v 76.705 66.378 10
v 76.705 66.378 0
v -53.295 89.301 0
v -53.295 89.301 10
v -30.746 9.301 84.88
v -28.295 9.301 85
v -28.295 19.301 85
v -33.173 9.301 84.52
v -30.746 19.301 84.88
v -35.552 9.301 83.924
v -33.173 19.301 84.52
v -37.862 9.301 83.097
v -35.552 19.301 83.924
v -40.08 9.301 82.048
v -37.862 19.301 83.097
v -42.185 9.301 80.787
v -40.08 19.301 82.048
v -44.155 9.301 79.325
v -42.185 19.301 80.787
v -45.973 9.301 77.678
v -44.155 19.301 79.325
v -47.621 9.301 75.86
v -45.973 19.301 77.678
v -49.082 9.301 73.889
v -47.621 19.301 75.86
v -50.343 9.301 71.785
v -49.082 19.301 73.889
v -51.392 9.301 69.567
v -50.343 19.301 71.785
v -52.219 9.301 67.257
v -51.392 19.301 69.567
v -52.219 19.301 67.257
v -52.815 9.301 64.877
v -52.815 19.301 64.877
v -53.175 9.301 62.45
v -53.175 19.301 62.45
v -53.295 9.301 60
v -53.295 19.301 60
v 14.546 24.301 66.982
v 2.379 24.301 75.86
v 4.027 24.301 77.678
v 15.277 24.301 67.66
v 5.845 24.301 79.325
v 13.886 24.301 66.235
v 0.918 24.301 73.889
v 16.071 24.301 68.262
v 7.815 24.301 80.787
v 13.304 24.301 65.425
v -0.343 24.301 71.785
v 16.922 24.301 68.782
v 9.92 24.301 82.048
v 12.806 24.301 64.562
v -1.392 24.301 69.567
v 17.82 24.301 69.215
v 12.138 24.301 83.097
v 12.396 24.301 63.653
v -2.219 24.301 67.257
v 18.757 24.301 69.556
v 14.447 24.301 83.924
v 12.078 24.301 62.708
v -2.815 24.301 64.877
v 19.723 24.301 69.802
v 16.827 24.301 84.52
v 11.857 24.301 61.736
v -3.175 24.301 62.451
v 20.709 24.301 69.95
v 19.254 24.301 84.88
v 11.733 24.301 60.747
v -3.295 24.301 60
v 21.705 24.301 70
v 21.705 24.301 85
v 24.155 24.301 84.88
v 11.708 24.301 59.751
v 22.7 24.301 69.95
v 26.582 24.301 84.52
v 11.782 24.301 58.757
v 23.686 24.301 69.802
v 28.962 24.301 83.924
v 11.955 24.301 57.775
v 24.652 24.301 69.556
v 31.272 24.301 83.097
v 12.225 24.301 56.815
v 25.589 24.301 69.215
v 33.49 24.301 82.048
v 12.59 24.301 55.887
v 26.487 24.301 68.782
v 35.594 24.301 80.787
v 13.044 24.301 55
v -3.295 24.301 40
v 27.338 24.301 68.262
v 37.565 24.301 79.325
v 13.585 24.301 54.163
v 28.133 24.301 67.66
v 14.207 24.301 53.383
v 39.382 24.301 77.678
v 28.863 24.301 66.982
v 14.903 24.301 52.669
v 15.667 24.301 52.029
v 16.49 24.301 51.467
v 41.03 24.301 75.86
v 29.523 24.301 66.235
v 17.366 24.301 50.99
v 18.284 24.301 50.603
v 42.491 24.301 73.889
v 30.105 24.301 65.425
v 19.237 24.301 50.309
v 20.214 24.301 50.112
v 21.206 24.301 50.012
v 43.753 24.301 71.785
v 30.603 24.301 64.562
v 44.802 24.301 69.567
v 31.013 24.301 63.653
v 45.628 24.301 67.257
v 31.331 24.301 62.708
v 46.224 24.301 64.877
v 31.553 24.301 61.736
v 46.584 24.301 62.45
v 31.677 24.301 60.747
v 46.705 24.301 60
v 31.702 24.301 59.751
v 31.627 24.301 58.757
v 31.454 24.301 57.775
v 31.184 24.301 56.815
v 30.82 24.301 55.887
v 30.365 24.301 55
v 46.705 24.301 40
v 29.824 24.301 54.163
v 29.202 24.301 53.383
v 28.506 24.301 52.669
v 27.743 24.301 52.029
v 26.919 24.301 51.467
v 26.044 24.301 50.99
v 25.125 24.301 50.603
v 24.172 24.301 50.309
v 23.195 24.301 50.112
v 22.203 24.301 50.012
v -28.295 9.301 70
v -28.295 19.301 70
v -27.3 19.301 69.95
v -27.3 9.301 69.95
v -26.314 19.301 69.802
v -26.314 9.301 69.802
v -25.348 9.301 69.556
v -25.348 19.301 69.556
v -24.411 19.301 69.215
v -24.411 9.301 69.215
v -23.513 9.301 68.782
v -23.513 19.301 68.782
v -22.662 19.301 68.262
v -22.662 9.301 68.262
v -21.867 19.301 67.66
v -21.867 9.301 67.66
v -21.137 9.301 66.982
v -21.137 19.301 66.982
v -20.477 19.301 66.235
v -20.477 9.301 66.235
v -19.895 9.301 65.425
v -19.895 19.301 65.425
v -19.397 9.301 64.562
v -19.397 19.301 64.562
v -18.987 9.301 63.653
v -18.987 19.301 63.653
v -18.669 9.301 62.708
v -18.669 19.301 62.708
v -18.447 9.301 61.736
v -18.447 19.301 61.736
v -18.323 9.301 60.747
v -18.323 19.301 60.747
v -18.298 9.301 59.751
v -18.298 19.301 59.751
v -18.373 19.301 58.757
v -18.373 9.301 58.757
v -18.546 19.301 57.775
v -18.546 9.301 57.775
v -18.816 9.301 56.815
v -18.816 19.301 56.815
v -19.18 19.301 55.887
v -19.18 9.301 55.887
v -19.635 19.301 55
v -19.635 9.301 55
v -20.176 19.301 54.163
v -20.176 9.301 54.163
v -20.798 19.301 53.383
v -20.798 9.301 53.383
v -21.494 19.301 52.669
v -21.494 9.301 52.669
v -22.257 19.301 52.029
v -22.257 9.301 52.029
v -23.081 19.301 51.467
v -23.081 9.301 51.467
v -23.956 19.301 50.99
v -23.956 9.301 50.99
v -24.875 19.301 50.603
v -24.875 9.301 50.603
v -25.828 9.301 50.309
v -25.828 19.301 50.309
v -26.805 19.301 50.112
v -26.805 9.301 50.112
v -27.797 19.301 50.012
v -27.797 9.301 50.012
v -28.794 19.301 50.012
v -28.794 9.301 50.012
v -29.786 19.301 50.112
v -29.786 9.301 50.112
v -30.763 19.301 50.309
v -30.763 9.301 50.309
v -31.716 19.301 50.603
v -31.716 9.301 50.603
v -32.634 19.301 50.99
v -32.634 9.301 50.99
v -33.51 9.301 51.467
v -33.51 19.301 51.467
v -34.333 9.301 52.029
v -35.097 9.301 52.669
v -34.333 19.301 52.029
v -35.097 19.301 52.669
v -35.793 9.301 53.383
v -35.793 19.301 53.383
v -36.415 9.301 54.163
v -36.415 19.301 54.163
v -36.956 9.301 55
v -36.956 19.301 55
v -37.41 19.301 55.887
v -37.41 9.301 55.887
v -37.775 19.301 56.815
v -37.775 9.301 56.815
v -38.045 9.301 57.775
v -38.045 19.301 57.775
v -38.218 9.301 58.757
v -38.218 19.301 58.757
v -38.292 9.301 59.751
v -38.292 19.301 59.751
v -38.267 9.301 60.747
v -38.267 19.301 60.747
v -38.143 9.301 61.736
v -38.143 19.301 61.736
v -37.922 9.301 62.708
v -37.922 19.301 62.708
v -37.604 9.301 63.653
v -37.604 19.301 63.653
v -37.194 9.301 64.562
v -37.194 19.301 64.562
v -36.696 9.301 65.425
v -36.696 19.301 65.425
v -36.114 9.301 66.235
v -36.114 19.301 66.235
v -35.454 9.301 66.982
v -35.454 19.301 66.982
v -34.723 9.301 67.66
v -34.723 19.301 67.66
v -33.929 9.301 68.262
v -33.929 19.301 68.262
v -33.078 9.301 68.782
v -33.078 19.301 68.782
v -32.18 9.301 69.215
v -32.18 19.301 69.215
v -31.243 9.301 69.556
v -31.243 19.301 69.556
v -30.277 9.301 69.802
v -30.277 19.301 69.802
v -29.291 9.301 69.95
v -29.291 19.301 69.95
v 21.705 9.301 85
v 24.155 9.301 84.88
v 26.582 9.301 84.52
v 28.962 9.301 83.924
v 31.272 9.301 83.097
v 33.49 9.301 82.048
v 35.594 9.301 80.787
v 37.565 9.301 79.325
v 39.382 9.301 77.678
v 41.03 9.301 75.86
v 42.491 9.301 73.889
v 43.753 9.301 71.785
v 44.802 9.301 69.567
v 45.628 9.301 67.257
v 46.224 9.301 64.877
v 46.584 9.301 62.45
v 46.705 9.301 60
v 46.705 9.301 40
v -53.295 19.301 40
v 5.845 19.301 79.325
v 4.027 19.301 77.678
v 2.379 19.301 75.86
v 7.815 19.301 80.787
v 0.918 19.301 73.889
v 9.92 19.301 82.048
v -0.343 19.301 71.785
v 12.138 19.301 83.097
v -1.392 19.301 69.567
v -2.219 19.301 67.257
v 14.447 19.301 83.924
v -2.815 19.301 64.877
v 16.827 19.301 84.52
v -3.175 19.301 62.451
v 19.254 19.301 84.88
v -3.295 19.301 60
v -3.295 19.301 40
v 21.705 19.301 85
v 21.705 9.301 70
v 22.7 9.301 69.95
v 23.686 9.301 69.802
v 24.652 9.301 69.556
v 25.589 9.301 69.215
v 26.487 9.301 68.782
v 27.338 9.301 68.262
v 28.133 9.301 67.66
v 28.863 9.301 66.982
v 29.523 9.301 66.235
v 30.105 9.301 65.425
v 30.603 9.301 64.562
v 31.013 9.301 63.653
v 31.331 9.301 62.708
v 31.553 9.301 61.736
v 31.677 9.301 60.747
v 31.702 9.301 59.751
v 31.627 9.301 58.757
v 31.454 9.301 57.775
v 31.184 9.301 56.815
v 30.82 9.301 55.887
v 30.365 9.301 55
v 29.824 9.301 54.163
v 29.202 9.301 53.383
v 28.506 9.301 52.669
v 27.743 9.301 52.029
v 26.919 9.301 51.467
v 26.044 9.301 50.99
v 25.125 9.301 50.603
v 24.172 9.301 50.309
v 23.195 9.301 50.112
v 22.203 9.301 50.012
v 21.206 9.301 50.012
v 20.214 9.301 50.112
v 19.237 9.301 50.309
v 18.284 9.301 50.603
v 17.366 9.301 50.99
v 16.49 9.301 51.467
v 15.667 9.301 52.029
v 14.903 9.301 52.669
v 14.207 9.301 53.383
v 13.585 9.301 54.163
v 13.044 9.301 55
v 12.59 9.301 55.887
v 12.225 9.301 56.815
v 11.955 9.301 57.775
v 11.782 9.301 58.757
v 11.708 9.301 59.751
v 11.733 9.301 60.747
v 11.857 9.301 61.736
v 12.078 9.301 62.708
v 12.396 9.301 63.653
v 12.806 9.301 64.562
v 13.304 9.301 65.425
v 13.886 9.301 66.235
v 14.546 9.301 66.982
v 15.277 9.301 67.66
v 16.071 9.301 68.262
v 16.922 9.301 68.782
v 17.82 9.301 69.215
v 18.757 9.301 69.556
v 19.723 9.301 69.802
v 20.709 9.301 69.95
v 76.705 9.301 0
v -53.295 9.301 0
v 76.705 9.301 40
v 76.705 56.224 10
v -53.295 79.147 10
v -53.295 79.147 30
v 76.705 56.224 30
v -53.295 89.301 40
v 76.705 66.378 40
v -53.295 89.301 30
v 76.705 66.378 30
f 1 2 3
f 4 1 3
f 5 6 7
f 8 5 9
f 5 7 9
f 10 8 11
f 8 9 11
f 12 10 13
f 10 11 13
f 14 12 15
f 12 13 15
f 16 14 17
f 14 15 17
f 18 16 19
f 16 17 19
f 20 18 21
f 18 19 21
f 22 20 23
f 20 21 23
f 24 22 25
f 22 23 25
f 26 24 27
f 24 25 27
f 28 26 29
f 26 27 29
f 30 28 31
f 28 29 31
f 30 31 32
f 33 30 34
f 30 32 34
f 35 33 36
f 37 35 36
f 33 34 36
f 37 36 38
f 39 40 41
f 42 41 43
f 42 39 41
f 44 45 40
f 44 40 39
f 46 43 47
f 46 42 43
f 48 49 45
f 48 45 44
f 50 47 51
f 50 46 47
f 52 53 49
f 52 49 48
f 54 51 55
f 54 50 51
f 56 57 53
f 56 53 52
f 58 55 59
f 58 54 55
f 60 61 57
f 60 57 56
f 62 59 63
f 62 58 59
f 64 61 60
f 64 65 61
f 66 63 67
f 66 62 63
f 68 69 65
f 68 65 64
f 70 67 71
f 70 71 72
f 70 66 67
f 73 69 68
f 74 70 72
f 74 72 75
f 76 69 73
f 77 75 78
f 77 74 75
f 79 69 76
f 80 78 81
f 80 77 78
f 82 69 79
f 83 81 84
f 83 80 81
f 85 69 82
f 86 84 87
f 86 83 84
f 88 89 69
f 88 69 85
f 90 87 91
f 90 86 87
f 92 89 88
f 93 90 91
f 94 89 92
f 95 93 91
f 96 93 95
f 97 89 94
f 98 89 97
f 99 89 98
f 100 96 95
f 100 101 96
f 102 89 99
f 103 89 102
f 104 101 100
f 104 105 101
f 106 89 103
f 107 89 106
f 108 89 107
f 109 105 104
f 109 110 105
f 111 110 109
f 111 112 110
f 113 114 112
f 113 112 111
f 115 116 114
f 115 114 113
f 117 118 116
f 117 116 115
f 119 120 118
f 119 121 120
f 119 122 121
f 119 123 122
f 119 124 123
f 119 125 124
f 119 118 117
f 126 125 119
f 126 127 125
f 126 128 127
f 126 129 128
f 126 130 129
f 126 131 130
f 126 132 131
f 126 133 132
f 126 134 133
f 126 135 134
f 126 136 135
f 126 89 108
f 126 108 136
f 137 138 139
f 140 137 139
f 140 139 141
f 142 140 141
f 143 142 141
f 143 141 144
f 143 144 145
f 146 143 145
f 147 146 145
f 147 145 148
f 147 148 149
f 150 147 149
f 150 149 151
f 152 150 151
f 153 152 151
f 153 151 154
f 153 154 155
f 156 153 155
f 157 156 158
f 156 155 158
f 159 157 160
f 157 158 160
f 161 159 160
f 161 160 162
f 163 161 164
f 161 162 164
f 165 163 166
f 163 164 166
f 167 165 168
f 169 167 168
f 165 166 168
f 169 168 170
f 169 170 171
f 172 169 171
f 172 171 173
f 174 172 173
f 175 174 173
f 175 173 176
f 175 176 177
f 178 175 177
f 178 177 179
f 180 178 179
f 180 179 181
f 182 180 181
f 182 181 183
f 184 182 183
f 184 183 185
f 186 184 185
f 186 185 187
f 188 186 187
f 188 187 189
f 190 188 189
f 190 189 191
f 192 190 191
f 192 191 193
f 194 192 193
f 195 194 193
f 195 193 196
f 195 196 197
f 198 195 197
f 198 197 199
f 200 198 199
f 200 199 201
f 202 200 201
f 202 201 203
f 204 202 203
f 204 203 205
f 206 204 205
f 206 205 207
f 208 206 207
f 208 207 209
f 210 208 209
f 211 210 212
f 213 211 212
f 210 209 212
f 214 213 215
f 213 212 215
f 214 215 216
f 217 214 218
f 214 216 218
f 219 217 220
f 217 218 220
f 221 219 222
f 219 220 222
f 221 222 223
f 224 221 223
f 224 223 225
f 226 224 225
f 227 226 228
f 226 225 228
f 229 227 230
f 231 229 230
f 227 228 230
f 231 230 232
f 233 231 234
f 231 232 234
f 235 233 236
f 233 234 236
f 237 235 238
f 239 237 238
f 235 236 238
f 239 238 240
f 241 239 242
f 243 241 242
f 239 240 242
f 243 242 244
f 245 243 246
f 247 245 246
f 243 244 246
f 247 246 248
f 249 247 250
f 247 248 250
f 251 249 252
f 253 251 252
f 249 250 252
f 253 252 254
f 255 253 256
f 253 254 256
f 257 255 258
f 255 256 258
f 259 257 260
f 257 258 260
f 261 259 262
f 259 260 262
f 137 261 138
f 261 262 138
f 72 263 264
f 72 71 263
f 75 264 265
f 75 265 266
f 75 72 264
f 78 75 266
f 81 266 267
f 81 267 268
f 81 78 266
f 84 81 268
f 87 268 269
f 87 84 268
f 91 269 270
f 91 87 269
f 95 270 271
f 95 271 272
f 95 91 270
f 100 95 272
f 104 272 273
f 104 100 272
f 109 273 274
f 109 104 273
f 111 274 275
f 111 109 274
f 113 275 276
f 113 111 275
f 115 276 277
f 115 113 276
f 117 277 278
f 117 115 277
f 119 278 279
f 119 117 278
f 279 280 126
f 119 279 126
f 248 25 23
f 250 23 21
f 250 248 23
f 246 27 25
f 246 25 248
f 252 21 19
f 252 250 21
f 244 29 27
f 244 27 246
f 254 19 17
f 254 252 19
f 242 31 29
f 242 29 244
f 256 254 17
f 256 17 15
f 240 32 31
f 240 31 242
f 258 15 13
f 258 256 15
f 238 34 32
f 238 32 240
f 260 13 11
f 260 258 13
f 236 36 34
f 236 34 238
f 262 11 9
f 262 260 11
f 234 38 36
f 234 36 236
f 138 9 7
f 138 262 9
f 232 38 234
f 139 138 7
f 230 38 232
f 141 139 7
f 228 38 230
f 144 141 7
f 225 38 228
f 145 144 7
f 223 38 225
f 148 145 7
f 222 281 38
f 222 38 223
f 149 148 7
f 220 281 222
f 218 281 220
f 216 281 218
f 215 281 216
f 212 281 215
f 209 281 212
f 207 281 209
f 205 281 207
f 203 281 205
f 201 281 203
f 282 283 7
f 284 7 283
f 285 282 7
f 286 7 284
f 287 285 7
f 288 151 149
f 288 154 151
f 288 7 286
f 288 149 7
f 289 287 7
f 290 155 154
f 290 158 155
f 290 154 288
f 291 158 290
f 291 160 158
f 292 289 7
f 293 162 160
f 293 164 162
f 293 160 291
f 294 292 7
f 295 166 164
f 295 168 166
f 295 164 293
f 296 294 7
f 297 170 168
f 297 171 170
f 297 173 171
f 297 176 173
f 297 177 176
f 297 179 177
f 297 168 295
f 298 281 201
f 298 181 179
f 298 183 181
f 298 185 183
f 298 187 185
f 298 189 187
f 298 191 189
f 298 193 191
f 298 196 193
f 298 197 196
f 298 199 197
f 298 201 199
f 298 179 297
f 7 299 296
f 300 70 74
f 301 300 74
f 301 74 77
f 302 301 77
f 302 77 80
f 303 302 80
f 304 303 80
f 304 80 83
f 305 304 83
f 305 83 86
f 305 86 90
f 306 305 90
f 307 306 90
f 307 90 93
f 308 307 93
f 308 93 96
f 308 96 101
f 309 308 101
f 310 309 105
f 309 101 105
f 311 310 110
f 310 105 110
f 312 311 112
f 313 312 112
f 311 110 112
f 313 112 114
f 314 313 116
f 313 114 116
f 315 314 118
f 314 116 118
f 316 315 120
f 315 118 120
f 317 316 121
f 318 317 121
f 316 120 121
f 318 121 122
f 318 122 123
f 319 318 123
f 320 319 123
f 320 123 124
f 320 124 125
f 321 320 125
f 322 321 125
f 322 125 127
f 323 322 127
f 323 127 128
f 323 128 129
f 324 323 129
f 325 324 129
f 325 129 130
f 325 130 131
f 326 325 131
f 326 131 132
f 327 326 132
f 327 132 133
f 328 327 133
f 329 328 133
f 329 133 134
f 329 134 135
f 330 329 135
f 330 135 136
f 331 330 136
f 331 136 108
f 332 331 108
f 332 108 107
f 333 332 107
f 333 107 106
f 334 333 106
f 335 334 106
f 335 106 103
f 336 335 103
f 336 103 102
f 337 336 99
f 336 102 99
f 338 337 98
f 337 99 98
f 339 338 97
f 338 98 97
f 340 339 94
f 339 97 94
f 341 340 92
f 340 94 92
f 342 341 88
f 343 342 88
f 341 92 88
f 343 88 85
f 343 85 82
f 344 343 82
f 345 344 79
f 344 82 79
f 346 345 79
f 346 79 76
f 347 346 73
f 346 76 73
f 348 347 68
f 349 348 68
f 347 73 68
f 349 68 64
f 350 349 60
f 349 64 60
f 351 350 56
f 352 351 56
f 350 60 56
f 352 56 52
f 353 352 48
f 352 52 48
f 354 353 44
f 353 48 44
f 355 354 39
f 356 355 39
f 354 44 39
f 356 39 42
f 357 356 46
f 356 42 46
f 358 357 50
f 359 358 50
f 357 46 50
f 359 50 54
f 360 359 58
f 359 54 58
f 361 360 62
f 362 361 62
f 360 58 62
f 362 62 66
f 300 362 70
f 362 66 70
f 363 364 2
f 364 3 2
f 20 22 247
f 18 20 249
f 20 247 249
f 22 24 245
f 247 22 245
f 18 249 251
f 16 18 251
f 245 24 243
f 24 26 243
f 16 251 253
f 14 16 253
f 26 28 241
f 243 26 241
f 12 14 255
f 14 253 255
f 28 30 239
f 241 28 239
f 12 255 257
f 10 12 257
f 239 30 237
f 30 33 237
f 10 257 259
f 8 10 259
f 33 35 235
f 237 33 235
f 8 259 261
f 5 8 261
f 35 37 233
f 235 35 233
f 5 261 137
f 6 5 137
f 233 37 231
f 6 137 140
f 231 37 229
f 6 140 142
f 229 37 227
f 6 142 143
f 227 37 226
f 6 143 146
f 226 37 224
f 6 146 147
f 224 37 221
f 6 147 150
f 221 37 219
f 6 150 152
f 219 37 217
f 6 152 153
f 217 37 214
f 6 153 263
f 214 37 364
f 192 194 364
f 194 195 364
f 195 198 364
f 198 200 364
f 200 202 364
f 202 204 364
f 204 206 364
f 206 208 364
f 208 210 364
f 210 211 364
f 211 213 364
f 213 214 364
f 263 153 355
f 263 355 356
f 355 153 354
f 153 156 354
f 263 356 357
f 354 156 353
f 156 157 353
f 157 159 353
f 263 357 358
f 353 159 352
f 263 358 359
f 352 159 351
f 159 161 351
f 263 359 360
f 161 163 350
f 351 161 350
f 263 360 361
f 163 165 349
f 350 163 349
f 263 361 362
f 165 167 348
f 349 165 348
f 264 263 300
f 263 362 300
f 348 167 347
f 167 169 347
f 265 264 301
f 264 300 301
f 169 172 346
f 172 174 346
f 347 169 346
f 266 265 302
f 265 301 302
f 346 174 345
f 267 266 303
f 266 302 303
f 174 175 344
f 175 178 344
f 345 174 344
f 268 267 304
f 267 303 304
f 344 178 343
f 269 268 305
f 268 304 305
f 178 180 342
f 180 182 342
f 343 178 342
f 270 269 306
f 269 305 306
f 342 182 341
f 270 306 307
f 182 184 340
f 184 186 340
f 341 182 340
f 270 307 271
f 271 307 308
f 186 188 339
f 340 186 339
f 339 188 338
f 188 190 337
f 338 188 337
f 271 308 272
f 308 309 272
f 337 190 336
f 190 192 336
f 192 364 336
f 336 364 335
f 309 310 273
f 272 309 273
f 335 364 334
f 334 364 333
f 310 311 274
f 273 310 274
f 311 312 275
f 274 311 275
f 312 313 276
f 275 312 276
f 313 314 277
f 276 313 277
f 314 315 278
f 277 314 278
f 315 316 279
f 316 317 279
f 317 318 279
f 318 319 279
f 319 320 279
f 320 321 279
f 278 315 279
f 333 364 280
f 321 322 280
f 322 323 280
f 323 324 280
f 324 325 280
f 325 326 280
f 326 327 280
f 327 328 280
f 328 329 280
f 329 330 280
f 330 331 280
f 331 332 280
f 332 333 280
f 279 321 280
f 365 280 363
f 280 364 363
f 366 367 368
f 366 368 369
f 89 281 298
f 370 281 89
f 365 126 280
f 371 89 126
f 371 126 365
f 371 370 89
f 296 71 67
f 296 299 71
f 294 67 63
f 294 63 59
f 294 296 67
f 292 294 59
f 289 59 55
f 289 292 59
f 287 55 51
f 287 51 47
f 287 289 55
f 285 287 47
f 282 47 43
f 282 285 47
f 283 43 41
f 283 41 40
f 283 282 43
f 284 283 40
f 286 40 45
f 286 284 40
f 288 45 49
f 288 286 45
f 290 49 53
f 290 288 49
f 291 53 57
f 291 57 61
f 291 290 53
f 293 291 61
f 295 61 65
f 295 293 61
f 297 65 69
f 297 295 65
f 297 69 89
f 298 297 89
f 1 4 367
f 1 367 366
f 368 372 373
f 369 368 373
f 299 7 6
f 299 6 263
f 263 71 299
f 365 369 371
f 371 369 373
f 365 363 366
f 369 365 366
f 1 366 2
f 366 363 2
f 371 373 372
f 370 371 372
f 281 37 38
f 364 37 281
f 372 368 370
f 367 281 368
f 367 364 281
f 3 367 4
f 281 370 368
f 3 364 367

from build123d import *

# Parameters (mm, degrees)
RESSALTO_EXTRUS_O1_DEPTH = 40
ESBO_O4_W                = 171.630568717
ESBO_O4_H                = 20
CORTE_EXTRUS_O3_DEPTH    = 10
ESBO_O5_W                = 100
ESBO_O5_H                = 15
RESSALTO_EXTRUS_O2_DEPTH = 45
ESBO_O6_R                = 10
CORTE_EXTRUS_O6_DEPTH    = 132.657158163
FILETE8_R                = 25
FILETE7_R                = 25
ESBO_O9_W                = 50
ESBO_O9_H                = 45
CORTE_EXTRUS_O7_DEPTH    = 5
FILETE9_R                = 25


with BuildPart() as part:
    # Esboço1 → Ressalto-extrusão1 (new body)
    with BuildSketch(Plane.XY):
        Polygon((-53.29532416, 9.300830565), (76.70467584, 9.300830565), (76.70467584, 66.378323073), (-53.29532416, 89.300830565), align=None)
    extrude(amount=RESSALTO_EXTRUS_O1_DEPTH)

    # Esboço4 → Corte-extrusão3 (cut)
    with BuildSketch(Plane(origin=(13.664290772, 77.494043834, 0), x_dir=(0.9848077530122075, -0.17364817766693377, 0), z_dir=(0.1736481776669338, 0.9848077530122076, 0))):
        with Locations((8.431345703, -20)):
            Rectangle(ESBO_O4_W, ESBO_O4_H)
    extrude(amount=-CORTE_EXTRUS_O3_DEPTH, mode=Mode.SUBTRACT)

    # Esboço5 → Ressalto-extrusão2 (add)
    with BuildSketch(Plane.XY.offset(40)):
        with Locations((-3.29532416, 16.800830565)):
            Rectangle(ESBO_O5_W, ESBO_O5_H)
    extrude(amount=RESSALTO_EXTRUS_O2_DEPTH)

    # Esboço6 → Corte-extrusão6 (cut, through all)
    with BuildSketch(Plane(origin=(0, 24.300830565, 0), x_dir=(1, 0, 0), z_dir=(0, 1, 0))):
        with Locations(Location((-28.29532416, -60, 0), (0, 0, 270))):
            Circle(ESBO_O6_R)
        with Locations(Location((21.70467584, -60, 0), (0, 0, 270))):
            Circle(ESBO_O6_R)
    extrude(amount=-CORTE_EXTRUS_O6_DEPTH, mode=Mode.SUBTRACT)

    # Filete8
    filete8_edges = [part.edges().sort_by_distance(p)[0] for p in [
        (46.70467584, 16.800830565, 85),
    ]]
    fillet(filete8_edges, radius=FILETE8_R)

    # Filete7
    filete7_edges = [part.edges().sort_by_distance(p)[0] for p in [
        (-53.29532416, 16.800830565, 85),
    ]]
    fillet(filete7_edges, radius=FILETE7_R)

    # Esboço9 → Corte-extrusão7 (cut)
    with BuildSketch(Plane(origin=(0, 24.300830565, 0), x_dir=(1, 0, 0), z_dir=(0, 1, 0))):
        with Locations((-28.29532416, -62.5)):
            Rectangle(ESBO_O9_W, ESBO_O9_H)
    extrude(amount=-CORTE_EXTRUS_O7_DEPTH, mode=Mode.SUBTRACT)

    # Filete9
    filete9_edges = [part.edges().sort_by_distance(p)[0] for p in [
        (-3.29532416, 21.800830565, 85),
    ]]
    fillet(filete9_edges, radius=FILETE9_R - 0.0001)  # a hair under: the kernel refuses the full size


solid = part.part
